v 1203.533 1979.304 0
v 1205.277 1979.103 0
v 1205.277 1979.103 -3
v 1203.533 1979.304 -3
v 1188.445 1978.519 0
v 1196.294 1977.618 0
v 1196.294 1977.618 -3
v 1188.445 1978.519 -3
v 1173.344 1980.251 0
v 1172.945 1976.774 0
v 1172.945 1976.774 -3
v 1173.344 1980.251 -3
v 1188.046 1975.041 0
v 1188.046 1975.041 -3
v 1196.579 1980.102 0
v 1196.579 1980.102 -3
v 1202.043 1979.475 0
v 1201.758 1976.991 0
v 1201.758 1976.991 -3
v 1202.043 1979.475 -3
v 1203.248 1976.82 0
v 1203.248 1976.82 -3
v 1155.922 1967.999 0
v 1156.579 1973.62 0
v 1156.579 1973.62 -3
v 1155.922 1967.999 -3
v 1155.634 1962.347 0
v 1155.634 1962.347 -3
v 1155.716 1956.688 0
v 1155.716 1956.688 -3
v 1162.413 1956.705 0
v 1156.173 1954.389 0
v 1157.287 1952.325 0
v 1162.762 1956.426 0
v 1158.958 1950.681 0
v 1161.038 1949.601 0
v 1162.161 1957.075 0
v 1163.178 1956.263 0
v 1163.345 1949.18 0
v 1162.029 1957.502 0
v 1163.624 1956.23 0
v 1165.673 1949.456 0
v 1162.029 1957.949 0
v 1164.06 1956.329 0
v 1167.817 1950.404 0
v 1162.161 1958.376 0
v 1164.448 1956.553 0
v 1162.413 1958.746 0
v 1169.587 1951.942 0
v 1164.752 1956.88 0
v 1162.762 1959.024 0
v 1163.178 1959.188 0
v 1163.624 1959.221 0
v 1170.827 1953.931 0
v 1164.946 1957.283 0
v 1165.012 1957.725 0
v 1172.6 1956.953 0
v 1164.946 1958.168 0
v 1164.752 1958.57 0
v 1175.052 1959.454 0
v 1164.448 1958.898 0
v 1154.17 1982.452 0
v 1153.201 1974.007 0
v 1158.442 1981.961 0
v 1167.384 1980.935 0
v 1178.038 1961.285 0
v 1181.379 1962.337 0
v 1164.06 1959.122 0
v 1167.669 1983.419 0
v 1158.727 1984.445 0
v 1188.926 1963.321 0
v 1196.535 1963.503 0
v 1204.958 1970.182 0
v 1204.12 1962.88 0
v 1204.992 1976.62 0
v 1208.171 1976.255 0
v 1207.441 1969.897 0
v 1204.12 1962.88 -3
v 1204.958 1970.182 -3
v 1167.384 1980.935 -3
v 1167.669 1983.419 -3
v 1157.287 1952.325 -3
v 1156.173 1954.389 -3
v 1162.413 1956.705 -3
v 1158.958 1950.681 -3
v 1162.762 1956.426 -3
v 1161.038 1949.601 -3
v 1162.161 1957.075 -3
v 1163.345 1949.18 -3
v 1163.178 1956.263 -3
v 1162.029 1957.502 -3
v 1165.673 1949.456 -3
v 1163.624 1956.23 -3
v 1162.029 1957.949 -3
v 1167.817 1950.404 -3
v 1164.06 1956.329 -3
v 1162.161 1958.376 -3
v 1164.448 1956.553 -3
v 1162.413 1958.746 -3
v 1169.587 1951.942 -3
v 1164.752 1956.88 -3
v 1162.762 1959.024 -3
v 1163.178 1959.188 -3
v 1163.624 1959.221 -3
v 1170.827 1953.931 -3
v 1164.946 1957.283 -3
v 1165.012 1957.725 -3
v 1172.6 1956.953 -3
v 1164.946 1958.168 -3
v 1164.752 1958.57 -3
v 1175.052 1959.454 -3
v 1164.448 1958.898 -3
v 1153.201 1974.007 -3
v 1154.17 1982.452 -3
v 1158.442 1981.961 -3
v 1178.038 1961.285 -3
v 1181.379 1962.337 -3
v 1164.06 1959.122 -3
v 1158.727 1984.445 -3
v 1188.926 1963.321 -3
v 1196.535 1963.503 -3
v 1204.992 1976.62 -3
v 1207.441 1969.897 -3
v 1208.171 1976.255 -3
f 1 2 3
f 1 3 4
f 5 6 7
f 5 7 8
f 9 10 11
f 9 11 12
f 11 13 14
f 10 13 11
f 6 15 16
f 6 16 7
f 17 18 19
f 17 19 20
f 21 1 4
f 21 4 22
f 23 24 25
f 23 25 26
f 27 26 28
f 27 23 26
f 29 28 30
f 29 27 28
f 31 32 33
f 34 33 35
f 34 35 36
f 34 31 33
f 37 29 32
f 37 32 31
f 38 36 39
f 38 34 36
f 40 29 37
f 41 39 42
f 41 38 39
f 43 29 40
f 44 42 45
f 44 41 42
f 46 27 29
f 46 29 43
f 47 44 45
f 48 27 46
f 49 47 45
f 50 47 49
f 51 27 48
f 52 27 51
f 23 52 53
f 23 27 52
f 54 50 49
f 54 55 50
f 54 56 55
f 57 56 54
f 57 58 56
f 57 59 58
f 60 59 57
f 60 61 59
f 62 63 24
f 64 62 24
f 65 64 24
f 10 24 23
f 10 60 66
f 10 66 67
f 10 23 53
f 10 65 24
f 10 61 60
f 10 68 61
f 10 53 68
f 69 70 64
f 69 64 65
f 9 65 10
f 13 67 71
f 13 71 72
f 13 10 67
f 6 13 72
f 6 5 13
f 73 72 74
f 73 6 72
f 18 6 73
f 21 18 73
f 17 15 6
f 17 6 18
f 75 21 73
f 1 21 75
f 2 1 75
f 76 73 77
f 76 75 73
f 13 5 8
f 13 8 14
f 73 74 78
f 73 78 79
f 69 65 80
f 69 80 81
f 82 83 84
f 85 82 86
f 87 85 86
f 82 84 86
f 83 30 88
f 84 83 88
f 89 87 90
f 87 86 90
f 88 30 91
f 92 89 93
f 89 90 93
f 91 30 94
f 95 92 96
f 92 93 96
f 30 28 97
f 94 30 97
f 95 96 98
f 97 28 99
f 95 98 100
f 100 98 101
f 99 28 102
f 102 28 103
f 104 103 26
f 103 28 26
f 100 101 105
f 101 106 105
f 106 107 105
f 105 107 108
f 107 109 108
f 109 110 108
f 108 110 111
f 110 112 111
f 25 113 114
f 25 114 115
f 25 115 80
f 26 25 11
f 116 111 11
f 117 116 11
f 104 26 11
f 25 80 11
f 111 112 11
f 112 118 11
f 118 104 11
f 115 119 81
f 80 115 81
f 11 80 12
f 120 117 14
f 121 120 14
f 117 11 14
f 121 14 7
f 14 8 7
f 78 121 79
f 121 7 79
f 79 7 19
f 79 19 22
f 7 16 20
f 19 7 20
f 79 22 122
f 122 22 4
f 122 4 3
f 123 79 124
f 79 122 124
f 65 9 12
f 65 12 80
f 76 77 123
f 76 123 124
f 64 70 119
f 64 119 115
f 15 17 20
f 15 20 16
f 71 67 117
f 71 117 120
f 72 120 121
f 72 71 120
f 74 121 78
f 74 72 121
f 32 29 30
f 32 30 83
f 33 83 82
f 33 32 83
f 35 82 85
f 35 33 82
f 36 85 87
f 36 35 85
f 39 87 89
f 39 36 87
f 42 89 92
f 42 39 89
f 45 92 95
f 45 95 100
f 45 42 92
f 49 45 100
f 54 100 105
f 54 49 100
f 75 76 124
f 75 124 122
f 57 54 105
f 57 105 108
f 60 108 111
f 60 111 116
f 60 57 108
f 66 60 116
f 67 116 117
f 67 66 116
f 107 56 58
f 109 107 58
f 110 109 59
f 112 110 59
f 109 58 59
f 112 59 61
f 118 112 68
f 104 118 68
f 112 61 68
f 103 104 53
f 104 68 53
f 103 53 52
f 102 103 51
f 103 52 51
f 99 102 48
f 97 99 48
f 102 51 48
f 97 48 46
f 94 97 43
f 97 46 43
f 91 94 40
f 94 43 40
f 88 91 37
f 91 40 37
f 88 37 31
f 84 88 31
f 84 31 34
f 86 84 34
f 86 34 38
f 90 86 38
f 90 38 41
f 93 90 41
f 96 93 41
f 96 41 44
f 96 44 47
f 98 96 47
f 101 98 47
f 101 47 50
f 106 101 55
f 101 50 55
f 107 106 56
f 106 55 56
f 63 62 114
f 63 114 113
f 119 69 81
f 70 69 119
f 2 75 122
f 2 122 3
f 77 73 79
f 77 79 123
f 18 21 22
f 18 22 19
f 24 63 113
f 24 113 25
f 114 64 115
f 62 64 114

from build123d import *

# Parameters (mm, degrees)
ESQUISSE1_R               = 1.5
T_LE_DE_BASE_PLI_E1_DEPTH = 3


# Sheet-metal steps are written as plain solids
with BuildPart() as part:
    # Esquisse1 → Tôle de base pliée1 (new body)
    with BuildSketch(Plane.XY):
        with BuildLine():
            Line((1154.170302219, 1982.451705153), (1153.201251986, 1974.007124545))
            Line((1153.201251986, 1974.007124545), (1156.579084229, 1973.619504452))
            ThreePointArc((1156.579084229, 1973.619504452), (1155.731717841, 1965.1750361), (1155.715622171, 1956.688174697))
            ThreePointArc((1155.715622171, 1956.688174697), (1162.175892986, 1949.303940909), (1170.827393014, 1953.931419154))
            ThreePointArc((1170.827393014, 1953.931419154), (1175.052398427, 1959.453694764), (1181.379439759, 1962.337225003))
            ThreePointArc((1181.379439759, 1962.337225003), (1192.728026875, 1963.512709412), (1204.119748438, 1962.879564131))
            Line((1204.119748438, 1962.879564131), (1204.957691875, 1970.181642657))
            Line((1204.957691875, 1970.181642657), (1207.441392054, 1969.896627882))
            Line((1207.441392054, 1969.896627882), (1208.171029877, 1976.25490034))
            Line((1208.171029877, 1976.25490034), (1204.991893648, 1976.619719251))
            Line((1204.991893648, 1976.619719251), (1205.276908423, 1979.10341943))
            Line((1205.276908423, 1979.10341943), (1203.533232527, 1979.303513385))
            Line((1203.533232527, 1979.303513385), (1203.248217753, 1976.819813206))
            Line((1203.248217753, 1976.819813206), (1201.757997646, 1976.990822071))
            Line((1201.757997646, 1976.990822071), (1202.04301242, 1979.47452225))
            Line((1202.04301242, 1979.47452225), (1196.578872027, 1980.101554754))
            Line((1196.578872027, 1980.101554754), (1196.293857252, 1977.617854575))
            Line((1196.293857252, 1977.617854575), (1188.445364687, 1978.518501263))
            Line((1188.445364687, 1978.518501263), (1188.046344003, 1975.041321013))
            Line((1188.046344003, 1975.041321013), (1172.945446915, 1976.774210843))
            Line((1172.945446915, 1976.774210843), (1173.3444676, 1980.251391093))
            Line((1173.3444676, 1980.251391093), (1167.383587171, 1980.935426552))
            Line((1167.383587171, 1980.935426552), (1167.668601945, 1983.419126731))
            Line((1167.668601945, 1983.419126731), (1158.727281302, 1984.445179919))
            Line((1158.727281302, 1984.445179919), (1158.442266527, 1981.961479741))
            Line((1158.442266527, 1981.961479741), (1154.170302219, 1982.451705153))
        make_face()
        with Locations((1163.512272203, 1957.725451963)):
            Circle(ESQUISSE1_R, mode=Mode.SUBTRACT)
    extrude(amount=-T_LE_DE_BASE_PLI_E1_DEPTH)


solid = part.part
